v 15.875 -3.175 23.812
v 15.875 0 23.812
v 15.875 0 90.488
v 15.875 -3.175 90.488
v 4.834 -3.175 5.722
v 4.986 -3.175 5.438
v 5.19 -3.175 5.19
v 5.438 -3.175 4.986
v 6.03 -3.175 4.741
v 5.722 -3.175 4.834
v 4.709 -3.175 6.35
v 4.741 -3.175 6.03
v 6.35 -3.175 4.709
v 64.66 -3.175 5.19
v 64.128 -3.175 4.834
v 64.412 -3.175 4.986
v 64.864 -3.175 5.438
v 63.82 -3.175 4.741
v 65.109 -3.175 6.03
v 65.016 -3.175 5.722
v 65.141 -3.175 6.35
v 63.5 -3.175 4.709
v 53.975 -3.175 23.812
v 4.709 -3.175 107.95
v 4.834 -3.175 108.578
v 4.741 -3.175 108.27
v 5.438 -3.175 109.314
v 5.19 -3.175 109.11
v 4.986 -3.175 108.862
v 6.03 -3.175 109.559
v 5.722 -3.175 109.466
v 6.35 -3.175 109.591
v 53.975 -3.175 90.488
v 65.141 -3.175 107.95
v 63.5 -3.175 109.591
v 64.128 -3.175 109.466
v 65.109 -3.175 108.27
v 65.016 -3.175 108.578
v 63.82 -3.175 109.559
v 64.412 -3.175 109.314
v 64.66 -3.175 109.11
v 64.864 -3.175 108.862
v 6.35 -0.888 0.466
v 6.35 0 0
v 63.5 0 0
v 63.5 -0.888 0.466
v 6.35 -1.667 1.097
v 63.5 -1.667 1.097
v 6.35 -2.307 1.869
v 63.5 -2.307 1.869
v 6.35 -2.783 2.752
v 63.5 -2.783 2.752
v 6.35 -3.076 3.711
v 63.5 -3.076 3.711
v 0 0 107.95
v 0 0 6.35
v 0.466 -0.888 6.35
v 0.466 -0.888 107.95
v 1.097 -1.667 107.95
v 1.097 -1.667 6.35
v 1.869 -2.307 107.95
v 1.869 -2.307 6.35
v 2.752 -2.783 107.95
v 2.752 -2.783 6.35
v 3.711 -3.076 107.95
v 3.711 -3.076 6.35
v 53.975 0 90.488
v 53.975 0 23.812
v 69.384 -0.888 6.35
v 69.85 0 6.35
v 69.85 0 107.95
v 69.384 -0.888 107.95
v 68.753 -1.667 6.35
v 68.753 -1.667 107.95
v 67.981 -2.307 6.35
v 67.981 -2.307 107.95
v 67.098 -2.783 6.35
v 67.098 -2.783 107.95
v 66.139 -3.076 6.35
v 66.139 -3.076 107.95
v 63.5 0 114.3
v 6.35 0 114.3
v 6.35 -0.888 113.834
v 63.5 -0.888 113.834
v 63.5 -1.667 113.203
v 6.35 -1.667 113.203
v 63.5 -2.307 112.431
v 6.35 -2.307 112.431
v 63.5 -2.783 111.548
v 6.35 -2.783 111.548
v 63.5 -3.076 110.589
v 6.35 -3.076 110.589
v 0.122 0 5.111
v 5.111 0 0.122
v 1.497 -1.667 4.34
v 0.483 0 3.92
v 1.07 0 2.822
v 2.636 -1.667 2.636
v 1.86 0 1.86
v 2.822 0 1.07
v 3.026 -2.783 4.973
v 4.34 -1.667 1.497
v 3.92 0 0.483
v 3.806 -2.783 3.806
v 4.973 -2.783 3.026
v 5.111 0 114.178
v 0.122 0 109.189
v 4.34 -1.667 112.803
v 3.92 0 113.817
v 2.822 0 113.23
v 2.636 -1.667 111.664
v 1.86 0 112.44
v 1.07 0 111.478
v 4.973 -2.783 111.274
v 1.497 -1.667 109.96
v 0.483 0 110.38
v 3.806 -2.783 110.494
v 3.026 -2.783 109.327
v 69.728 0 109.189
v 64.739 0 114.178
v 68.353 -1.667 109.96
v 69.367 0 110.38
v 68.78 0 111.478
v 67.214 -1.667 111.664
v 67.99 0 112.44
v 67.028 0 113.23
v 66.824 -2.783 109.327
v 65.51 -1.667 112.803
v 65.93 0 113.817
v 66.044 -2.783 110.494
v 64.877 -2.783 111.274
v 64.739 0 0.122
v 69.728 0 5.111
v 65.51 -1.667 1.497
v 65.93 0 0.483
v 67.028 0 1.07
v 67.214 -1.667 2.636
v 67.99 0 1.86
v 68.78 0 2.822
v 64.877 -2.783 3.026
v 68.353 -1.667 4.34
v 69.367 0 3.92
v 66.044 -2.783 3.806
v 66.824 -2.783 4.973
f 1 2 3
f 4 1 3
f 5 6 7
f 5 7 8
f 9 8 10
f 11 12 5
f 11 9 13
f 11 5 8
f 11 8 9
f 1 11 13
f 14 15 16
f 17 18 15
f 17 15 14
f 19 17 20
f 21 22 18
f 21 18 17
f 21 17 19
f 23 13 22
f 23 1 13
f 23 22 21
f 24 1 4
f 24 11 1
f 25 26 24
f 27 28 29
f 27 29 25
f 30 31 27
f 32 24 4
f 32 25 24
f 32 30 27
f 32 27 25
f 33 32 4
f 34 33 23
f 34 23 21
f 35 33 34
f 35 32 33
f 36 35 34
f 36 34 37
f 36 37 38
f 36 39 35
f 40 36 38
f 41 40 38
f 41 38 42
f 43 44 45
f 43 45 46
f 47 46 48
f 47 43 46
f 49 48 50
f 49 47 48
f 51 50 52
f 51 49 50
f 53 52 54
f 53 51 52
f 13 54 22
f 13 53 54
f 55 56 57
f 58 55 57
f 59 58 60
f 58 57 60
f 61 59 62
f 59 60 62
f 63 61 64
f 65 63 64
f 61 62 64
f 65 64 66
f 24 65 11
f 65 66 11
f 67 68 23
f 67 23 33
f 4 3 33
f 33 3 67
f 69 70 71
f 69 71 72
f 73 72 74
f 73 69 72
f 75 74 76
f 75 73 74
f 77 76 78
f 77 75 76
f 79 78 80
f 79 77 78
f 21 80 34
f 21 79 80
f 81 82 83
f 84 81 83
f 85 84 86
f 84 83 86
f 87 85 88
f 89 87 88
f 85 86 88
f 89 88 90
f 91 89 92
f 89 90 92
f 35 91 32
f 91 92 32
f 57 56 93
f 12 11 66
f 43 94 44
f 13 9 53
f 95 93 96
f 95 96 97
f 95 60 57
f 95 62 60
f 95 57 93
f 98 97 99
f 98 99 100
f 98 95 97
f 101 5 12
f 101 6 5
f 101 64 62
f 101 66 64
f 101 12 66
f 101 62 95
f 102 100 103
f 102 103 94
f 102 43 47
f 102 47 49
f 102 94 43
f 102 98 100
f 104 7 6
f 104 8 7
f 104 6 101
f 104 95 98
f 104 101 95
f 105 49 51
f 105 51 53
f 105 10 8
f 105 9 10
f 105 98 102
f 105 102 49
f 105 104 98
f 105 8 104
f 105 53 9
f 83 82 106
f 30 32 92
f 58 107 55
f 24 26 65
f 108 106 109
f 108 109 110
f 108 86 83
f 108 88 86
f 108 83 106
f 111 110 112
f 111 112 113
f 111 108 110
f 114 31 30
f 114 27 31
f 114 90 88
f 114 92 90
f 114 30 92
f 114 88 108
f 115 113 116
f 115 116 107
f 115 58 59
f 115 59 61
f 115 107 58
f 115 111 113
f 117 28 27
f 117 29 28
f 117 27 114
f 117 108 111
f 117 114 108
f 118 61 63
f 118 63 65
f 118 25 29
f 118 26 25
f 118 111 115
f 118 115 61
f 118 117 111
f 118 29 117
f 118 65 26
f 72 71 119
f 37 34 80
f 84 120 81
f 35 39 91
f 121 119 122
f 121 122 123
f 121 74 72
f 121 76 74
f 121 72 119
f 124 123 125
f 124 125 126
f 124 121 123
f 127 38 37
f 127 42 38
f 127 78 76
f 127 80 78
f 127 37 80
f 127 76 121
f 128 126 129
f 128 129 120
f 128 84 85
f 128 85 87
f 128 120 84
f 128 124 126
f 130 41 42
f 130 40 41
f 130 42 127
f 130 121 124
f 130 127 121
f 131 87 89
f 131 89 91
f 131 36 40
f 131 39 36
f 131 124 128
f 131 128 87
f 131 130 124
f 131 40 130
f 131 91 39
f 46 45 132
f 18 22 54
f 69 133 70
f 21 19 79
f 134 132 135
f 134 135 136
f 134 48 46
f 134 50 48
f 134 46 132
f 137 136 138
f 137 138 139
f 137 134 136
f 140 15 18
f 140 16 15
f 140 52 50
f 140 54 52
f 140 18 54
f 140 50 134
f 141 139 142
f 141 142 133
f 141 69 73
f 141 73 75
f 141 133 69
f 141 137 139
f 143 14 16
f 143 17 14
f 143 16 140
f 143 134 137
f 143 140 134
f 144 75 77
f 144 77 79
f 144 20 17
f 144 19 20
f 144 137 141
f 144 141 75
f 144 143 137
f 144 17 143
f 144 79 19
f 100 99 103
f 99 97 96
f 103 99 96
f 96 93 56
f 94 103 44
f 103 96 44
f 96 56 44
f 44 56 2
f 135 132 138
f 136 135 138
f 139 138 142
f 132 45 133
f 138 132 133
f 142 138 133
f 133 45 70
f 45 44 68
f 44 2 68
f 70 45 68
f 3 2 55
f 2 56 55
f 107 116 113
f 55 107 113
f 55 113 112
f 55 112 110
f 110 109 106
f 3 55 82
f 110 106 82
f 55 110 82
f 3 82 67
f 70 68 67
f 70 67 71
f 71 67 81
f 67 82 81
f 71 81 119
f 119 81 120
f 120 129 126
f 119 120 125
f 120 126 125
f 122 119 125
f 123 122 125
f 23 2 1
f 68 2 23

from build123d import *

# Parameters (mm, degrees)
F0_W         = 38.1
F0_H         = 66.675
F1_DEPTH     = 3.175
F2_T1_DEPTH  = 57.15
F2_T3_DEPTH  = 101.6
F2_T6_ANGLE  = 90
F2_T8_ANGLE  = 90
F2_T10_ANGLE = 90
F2_T12_ANGLE = 90


# Not quite as in the source:
# - a fillet or chamfer that OpenCascade refuses, or shapes differently, is made with other operations: its cross-section is extruded or revolved along the edge and cut away or added


with BuildPart() as f1:
    # F0 (on Front) → F1 (new body)
    with BuildSketch(Plane.XZ):
        with BuildLine():
            ThreePointArc((0, 6.35), (1.8598719395, 1.8598719395), (6.35, 0))
            Line((6.35, 0), (63.5, 0))
            ThreePointArc((63.5, 0), (67.9901280605, 1.8598719395), (69.85, 6.35))
            Line((69.85, 6.35), (69.85, 107.95))
            ThreePointArc((69.85, 107.95), (67.9901280605, 112.4401280605), (63.5, 114.3))
            Line((63.5, 114.3), (6.35, 114.3))
            ThreePointArc((6.35, 114.3), (1.8598719395, 112.4401280605), (0, 107.95))
            Line((0, 107.95), (0, 6.35))
        make_face()
        with Locations((34.925, 57.15)):
            Rectangle(F0_W, F0_H, mode=Mode.SUBTRACT)
    extrude(amount=F1_DEPTH)

    # F2: fillet of radius 5.08 on 1 edges, made by hand

    # F2_s2 → F2_t1 (cut)
    with BuildSketch(Plane.YZ.offset(6.35)):
        with BuildLine():
            ThreePointArc((0, 114.3), (-2.3071134838, 112.4305202921), (-3.175, 109.5907139607))
            Line((-3.175, 109.5907139607), (-3.175, 114.3))
            Line((-3.175, 114.3), (0, 114.3))
        make_face()
        with BuildLine():
            ThreePointArc((0, 0), (-2.3071134838, 1.8694797079), (-3.175, 4.7092860393))
            Line((-3.175, 4.7092860393), (-3.175, 0))
            Line((-3.175, 0), (0, 0))
        make_face()
    extrude(amount=F2_T1_DEPTH, mode=Mode.SUBTRACT)

    # F2_s4 → F2_t3 (cut)
    with BuildSketch(Plane.XY.offset(6.35)):
        with BuildLine():
            ThreePointArc((0, 0), (1.8694797079, -2.3071134838), (4.7092860393, -3.175))
            Line((4.7092860393, -3.175), (0, -3.175))
            Line((0, -3.175), (0, 0))
        make_face()
        with BuildLine():
            ThreePointArc((69.85, 0), (67.9805202921, -2.3071134838), (65.1407139607, -3.175))
            Line((65.1407139607, -3.175), (69.85, -3.175))
            Line((69.85, -3.175), (69.85, 0))
        make_face()
    extrude(amount=F2_T3_DEPTH, mode=Mode.SUBTRACT)

    # F2_s5 → F2_t6 (revolve, cut)
    with BuildSketch(Plane.XY.offset(107.95)):
        with BuildLine():
            ThreePointArc((69.85, 0), (67.9805202921, -2.3071134838), (65.1407139607, -3.175))
            Line((65.1407139607, -3.175), (69.85, -3.175))
            Line((69.85, -3.175), (69.85, 0))
        make_face()
    revolve(axis=Axis((63.5, -3.175, 107.95), (0, -1, 0)), revolution_arc=F2_T6_ANGLE, mode=Mode.SUBTRACT)

    # F2_s7 → F2_t8 (revolve, cut)
    with BuildSketch(Plane.YZ.offset(6.35)):
        with BuildLine():
            ThreePointArc((0, 114.3), (-2.3071134838, 112.4305202921), (-3.175, 109.5907139607))
            Line((-3.175, 109.5907139607), (-3.175, 114.3))
            Line((-3.175, 114.3), (0, 114.3))
        make_face()
    revolve(axis=Axis((6.35, -3.175, 107.95), (0, -1, 0)), revolution_arc=F2_T8_ANGLE, mode=Mode.SUBTRACT)

    # F2_s9 → F2_t10 (revolve, cut)
    with BuildSketch(Plane.XY.offset(6.35)):
        with BuildLine():
            ThreePointArc((0, 0), (1.8694797079, -2.3071134838), (4.7092860393, -3.175))
            Line((4.7092860393, -3.175), (0, -3.175))
            Line((0, -3.175), (0, 0))
        make_face()
    revolve(axis=Axis((6.35, -3.175, 6.35), (0, -1, 0)), revolution_arc=F2_T10_ANGLE, mode=Mode.SUBTRACT)

    # F2_s11 → F2_t12 (revolve, cut)
    with BuildSketch(Plane.YZ.offset(63.5)):
        with BuildLine():
            ThreePointArc((0, 0), (-2.3071134838, 1.8694797079), (-3.175, 4.7092860393))
            Line((-3.175, 4.7092860393), (-3.175, 0))
            Line((-3.175, 0), (0, 0))
        make_face()
    revolve(axis=Axis((63.5, -3.175, 6.35), (0, -1, 0)), revolution_arc=F2_T12_ANGLE, mode=Mode.SUBTRACT)


solid = f1.part
